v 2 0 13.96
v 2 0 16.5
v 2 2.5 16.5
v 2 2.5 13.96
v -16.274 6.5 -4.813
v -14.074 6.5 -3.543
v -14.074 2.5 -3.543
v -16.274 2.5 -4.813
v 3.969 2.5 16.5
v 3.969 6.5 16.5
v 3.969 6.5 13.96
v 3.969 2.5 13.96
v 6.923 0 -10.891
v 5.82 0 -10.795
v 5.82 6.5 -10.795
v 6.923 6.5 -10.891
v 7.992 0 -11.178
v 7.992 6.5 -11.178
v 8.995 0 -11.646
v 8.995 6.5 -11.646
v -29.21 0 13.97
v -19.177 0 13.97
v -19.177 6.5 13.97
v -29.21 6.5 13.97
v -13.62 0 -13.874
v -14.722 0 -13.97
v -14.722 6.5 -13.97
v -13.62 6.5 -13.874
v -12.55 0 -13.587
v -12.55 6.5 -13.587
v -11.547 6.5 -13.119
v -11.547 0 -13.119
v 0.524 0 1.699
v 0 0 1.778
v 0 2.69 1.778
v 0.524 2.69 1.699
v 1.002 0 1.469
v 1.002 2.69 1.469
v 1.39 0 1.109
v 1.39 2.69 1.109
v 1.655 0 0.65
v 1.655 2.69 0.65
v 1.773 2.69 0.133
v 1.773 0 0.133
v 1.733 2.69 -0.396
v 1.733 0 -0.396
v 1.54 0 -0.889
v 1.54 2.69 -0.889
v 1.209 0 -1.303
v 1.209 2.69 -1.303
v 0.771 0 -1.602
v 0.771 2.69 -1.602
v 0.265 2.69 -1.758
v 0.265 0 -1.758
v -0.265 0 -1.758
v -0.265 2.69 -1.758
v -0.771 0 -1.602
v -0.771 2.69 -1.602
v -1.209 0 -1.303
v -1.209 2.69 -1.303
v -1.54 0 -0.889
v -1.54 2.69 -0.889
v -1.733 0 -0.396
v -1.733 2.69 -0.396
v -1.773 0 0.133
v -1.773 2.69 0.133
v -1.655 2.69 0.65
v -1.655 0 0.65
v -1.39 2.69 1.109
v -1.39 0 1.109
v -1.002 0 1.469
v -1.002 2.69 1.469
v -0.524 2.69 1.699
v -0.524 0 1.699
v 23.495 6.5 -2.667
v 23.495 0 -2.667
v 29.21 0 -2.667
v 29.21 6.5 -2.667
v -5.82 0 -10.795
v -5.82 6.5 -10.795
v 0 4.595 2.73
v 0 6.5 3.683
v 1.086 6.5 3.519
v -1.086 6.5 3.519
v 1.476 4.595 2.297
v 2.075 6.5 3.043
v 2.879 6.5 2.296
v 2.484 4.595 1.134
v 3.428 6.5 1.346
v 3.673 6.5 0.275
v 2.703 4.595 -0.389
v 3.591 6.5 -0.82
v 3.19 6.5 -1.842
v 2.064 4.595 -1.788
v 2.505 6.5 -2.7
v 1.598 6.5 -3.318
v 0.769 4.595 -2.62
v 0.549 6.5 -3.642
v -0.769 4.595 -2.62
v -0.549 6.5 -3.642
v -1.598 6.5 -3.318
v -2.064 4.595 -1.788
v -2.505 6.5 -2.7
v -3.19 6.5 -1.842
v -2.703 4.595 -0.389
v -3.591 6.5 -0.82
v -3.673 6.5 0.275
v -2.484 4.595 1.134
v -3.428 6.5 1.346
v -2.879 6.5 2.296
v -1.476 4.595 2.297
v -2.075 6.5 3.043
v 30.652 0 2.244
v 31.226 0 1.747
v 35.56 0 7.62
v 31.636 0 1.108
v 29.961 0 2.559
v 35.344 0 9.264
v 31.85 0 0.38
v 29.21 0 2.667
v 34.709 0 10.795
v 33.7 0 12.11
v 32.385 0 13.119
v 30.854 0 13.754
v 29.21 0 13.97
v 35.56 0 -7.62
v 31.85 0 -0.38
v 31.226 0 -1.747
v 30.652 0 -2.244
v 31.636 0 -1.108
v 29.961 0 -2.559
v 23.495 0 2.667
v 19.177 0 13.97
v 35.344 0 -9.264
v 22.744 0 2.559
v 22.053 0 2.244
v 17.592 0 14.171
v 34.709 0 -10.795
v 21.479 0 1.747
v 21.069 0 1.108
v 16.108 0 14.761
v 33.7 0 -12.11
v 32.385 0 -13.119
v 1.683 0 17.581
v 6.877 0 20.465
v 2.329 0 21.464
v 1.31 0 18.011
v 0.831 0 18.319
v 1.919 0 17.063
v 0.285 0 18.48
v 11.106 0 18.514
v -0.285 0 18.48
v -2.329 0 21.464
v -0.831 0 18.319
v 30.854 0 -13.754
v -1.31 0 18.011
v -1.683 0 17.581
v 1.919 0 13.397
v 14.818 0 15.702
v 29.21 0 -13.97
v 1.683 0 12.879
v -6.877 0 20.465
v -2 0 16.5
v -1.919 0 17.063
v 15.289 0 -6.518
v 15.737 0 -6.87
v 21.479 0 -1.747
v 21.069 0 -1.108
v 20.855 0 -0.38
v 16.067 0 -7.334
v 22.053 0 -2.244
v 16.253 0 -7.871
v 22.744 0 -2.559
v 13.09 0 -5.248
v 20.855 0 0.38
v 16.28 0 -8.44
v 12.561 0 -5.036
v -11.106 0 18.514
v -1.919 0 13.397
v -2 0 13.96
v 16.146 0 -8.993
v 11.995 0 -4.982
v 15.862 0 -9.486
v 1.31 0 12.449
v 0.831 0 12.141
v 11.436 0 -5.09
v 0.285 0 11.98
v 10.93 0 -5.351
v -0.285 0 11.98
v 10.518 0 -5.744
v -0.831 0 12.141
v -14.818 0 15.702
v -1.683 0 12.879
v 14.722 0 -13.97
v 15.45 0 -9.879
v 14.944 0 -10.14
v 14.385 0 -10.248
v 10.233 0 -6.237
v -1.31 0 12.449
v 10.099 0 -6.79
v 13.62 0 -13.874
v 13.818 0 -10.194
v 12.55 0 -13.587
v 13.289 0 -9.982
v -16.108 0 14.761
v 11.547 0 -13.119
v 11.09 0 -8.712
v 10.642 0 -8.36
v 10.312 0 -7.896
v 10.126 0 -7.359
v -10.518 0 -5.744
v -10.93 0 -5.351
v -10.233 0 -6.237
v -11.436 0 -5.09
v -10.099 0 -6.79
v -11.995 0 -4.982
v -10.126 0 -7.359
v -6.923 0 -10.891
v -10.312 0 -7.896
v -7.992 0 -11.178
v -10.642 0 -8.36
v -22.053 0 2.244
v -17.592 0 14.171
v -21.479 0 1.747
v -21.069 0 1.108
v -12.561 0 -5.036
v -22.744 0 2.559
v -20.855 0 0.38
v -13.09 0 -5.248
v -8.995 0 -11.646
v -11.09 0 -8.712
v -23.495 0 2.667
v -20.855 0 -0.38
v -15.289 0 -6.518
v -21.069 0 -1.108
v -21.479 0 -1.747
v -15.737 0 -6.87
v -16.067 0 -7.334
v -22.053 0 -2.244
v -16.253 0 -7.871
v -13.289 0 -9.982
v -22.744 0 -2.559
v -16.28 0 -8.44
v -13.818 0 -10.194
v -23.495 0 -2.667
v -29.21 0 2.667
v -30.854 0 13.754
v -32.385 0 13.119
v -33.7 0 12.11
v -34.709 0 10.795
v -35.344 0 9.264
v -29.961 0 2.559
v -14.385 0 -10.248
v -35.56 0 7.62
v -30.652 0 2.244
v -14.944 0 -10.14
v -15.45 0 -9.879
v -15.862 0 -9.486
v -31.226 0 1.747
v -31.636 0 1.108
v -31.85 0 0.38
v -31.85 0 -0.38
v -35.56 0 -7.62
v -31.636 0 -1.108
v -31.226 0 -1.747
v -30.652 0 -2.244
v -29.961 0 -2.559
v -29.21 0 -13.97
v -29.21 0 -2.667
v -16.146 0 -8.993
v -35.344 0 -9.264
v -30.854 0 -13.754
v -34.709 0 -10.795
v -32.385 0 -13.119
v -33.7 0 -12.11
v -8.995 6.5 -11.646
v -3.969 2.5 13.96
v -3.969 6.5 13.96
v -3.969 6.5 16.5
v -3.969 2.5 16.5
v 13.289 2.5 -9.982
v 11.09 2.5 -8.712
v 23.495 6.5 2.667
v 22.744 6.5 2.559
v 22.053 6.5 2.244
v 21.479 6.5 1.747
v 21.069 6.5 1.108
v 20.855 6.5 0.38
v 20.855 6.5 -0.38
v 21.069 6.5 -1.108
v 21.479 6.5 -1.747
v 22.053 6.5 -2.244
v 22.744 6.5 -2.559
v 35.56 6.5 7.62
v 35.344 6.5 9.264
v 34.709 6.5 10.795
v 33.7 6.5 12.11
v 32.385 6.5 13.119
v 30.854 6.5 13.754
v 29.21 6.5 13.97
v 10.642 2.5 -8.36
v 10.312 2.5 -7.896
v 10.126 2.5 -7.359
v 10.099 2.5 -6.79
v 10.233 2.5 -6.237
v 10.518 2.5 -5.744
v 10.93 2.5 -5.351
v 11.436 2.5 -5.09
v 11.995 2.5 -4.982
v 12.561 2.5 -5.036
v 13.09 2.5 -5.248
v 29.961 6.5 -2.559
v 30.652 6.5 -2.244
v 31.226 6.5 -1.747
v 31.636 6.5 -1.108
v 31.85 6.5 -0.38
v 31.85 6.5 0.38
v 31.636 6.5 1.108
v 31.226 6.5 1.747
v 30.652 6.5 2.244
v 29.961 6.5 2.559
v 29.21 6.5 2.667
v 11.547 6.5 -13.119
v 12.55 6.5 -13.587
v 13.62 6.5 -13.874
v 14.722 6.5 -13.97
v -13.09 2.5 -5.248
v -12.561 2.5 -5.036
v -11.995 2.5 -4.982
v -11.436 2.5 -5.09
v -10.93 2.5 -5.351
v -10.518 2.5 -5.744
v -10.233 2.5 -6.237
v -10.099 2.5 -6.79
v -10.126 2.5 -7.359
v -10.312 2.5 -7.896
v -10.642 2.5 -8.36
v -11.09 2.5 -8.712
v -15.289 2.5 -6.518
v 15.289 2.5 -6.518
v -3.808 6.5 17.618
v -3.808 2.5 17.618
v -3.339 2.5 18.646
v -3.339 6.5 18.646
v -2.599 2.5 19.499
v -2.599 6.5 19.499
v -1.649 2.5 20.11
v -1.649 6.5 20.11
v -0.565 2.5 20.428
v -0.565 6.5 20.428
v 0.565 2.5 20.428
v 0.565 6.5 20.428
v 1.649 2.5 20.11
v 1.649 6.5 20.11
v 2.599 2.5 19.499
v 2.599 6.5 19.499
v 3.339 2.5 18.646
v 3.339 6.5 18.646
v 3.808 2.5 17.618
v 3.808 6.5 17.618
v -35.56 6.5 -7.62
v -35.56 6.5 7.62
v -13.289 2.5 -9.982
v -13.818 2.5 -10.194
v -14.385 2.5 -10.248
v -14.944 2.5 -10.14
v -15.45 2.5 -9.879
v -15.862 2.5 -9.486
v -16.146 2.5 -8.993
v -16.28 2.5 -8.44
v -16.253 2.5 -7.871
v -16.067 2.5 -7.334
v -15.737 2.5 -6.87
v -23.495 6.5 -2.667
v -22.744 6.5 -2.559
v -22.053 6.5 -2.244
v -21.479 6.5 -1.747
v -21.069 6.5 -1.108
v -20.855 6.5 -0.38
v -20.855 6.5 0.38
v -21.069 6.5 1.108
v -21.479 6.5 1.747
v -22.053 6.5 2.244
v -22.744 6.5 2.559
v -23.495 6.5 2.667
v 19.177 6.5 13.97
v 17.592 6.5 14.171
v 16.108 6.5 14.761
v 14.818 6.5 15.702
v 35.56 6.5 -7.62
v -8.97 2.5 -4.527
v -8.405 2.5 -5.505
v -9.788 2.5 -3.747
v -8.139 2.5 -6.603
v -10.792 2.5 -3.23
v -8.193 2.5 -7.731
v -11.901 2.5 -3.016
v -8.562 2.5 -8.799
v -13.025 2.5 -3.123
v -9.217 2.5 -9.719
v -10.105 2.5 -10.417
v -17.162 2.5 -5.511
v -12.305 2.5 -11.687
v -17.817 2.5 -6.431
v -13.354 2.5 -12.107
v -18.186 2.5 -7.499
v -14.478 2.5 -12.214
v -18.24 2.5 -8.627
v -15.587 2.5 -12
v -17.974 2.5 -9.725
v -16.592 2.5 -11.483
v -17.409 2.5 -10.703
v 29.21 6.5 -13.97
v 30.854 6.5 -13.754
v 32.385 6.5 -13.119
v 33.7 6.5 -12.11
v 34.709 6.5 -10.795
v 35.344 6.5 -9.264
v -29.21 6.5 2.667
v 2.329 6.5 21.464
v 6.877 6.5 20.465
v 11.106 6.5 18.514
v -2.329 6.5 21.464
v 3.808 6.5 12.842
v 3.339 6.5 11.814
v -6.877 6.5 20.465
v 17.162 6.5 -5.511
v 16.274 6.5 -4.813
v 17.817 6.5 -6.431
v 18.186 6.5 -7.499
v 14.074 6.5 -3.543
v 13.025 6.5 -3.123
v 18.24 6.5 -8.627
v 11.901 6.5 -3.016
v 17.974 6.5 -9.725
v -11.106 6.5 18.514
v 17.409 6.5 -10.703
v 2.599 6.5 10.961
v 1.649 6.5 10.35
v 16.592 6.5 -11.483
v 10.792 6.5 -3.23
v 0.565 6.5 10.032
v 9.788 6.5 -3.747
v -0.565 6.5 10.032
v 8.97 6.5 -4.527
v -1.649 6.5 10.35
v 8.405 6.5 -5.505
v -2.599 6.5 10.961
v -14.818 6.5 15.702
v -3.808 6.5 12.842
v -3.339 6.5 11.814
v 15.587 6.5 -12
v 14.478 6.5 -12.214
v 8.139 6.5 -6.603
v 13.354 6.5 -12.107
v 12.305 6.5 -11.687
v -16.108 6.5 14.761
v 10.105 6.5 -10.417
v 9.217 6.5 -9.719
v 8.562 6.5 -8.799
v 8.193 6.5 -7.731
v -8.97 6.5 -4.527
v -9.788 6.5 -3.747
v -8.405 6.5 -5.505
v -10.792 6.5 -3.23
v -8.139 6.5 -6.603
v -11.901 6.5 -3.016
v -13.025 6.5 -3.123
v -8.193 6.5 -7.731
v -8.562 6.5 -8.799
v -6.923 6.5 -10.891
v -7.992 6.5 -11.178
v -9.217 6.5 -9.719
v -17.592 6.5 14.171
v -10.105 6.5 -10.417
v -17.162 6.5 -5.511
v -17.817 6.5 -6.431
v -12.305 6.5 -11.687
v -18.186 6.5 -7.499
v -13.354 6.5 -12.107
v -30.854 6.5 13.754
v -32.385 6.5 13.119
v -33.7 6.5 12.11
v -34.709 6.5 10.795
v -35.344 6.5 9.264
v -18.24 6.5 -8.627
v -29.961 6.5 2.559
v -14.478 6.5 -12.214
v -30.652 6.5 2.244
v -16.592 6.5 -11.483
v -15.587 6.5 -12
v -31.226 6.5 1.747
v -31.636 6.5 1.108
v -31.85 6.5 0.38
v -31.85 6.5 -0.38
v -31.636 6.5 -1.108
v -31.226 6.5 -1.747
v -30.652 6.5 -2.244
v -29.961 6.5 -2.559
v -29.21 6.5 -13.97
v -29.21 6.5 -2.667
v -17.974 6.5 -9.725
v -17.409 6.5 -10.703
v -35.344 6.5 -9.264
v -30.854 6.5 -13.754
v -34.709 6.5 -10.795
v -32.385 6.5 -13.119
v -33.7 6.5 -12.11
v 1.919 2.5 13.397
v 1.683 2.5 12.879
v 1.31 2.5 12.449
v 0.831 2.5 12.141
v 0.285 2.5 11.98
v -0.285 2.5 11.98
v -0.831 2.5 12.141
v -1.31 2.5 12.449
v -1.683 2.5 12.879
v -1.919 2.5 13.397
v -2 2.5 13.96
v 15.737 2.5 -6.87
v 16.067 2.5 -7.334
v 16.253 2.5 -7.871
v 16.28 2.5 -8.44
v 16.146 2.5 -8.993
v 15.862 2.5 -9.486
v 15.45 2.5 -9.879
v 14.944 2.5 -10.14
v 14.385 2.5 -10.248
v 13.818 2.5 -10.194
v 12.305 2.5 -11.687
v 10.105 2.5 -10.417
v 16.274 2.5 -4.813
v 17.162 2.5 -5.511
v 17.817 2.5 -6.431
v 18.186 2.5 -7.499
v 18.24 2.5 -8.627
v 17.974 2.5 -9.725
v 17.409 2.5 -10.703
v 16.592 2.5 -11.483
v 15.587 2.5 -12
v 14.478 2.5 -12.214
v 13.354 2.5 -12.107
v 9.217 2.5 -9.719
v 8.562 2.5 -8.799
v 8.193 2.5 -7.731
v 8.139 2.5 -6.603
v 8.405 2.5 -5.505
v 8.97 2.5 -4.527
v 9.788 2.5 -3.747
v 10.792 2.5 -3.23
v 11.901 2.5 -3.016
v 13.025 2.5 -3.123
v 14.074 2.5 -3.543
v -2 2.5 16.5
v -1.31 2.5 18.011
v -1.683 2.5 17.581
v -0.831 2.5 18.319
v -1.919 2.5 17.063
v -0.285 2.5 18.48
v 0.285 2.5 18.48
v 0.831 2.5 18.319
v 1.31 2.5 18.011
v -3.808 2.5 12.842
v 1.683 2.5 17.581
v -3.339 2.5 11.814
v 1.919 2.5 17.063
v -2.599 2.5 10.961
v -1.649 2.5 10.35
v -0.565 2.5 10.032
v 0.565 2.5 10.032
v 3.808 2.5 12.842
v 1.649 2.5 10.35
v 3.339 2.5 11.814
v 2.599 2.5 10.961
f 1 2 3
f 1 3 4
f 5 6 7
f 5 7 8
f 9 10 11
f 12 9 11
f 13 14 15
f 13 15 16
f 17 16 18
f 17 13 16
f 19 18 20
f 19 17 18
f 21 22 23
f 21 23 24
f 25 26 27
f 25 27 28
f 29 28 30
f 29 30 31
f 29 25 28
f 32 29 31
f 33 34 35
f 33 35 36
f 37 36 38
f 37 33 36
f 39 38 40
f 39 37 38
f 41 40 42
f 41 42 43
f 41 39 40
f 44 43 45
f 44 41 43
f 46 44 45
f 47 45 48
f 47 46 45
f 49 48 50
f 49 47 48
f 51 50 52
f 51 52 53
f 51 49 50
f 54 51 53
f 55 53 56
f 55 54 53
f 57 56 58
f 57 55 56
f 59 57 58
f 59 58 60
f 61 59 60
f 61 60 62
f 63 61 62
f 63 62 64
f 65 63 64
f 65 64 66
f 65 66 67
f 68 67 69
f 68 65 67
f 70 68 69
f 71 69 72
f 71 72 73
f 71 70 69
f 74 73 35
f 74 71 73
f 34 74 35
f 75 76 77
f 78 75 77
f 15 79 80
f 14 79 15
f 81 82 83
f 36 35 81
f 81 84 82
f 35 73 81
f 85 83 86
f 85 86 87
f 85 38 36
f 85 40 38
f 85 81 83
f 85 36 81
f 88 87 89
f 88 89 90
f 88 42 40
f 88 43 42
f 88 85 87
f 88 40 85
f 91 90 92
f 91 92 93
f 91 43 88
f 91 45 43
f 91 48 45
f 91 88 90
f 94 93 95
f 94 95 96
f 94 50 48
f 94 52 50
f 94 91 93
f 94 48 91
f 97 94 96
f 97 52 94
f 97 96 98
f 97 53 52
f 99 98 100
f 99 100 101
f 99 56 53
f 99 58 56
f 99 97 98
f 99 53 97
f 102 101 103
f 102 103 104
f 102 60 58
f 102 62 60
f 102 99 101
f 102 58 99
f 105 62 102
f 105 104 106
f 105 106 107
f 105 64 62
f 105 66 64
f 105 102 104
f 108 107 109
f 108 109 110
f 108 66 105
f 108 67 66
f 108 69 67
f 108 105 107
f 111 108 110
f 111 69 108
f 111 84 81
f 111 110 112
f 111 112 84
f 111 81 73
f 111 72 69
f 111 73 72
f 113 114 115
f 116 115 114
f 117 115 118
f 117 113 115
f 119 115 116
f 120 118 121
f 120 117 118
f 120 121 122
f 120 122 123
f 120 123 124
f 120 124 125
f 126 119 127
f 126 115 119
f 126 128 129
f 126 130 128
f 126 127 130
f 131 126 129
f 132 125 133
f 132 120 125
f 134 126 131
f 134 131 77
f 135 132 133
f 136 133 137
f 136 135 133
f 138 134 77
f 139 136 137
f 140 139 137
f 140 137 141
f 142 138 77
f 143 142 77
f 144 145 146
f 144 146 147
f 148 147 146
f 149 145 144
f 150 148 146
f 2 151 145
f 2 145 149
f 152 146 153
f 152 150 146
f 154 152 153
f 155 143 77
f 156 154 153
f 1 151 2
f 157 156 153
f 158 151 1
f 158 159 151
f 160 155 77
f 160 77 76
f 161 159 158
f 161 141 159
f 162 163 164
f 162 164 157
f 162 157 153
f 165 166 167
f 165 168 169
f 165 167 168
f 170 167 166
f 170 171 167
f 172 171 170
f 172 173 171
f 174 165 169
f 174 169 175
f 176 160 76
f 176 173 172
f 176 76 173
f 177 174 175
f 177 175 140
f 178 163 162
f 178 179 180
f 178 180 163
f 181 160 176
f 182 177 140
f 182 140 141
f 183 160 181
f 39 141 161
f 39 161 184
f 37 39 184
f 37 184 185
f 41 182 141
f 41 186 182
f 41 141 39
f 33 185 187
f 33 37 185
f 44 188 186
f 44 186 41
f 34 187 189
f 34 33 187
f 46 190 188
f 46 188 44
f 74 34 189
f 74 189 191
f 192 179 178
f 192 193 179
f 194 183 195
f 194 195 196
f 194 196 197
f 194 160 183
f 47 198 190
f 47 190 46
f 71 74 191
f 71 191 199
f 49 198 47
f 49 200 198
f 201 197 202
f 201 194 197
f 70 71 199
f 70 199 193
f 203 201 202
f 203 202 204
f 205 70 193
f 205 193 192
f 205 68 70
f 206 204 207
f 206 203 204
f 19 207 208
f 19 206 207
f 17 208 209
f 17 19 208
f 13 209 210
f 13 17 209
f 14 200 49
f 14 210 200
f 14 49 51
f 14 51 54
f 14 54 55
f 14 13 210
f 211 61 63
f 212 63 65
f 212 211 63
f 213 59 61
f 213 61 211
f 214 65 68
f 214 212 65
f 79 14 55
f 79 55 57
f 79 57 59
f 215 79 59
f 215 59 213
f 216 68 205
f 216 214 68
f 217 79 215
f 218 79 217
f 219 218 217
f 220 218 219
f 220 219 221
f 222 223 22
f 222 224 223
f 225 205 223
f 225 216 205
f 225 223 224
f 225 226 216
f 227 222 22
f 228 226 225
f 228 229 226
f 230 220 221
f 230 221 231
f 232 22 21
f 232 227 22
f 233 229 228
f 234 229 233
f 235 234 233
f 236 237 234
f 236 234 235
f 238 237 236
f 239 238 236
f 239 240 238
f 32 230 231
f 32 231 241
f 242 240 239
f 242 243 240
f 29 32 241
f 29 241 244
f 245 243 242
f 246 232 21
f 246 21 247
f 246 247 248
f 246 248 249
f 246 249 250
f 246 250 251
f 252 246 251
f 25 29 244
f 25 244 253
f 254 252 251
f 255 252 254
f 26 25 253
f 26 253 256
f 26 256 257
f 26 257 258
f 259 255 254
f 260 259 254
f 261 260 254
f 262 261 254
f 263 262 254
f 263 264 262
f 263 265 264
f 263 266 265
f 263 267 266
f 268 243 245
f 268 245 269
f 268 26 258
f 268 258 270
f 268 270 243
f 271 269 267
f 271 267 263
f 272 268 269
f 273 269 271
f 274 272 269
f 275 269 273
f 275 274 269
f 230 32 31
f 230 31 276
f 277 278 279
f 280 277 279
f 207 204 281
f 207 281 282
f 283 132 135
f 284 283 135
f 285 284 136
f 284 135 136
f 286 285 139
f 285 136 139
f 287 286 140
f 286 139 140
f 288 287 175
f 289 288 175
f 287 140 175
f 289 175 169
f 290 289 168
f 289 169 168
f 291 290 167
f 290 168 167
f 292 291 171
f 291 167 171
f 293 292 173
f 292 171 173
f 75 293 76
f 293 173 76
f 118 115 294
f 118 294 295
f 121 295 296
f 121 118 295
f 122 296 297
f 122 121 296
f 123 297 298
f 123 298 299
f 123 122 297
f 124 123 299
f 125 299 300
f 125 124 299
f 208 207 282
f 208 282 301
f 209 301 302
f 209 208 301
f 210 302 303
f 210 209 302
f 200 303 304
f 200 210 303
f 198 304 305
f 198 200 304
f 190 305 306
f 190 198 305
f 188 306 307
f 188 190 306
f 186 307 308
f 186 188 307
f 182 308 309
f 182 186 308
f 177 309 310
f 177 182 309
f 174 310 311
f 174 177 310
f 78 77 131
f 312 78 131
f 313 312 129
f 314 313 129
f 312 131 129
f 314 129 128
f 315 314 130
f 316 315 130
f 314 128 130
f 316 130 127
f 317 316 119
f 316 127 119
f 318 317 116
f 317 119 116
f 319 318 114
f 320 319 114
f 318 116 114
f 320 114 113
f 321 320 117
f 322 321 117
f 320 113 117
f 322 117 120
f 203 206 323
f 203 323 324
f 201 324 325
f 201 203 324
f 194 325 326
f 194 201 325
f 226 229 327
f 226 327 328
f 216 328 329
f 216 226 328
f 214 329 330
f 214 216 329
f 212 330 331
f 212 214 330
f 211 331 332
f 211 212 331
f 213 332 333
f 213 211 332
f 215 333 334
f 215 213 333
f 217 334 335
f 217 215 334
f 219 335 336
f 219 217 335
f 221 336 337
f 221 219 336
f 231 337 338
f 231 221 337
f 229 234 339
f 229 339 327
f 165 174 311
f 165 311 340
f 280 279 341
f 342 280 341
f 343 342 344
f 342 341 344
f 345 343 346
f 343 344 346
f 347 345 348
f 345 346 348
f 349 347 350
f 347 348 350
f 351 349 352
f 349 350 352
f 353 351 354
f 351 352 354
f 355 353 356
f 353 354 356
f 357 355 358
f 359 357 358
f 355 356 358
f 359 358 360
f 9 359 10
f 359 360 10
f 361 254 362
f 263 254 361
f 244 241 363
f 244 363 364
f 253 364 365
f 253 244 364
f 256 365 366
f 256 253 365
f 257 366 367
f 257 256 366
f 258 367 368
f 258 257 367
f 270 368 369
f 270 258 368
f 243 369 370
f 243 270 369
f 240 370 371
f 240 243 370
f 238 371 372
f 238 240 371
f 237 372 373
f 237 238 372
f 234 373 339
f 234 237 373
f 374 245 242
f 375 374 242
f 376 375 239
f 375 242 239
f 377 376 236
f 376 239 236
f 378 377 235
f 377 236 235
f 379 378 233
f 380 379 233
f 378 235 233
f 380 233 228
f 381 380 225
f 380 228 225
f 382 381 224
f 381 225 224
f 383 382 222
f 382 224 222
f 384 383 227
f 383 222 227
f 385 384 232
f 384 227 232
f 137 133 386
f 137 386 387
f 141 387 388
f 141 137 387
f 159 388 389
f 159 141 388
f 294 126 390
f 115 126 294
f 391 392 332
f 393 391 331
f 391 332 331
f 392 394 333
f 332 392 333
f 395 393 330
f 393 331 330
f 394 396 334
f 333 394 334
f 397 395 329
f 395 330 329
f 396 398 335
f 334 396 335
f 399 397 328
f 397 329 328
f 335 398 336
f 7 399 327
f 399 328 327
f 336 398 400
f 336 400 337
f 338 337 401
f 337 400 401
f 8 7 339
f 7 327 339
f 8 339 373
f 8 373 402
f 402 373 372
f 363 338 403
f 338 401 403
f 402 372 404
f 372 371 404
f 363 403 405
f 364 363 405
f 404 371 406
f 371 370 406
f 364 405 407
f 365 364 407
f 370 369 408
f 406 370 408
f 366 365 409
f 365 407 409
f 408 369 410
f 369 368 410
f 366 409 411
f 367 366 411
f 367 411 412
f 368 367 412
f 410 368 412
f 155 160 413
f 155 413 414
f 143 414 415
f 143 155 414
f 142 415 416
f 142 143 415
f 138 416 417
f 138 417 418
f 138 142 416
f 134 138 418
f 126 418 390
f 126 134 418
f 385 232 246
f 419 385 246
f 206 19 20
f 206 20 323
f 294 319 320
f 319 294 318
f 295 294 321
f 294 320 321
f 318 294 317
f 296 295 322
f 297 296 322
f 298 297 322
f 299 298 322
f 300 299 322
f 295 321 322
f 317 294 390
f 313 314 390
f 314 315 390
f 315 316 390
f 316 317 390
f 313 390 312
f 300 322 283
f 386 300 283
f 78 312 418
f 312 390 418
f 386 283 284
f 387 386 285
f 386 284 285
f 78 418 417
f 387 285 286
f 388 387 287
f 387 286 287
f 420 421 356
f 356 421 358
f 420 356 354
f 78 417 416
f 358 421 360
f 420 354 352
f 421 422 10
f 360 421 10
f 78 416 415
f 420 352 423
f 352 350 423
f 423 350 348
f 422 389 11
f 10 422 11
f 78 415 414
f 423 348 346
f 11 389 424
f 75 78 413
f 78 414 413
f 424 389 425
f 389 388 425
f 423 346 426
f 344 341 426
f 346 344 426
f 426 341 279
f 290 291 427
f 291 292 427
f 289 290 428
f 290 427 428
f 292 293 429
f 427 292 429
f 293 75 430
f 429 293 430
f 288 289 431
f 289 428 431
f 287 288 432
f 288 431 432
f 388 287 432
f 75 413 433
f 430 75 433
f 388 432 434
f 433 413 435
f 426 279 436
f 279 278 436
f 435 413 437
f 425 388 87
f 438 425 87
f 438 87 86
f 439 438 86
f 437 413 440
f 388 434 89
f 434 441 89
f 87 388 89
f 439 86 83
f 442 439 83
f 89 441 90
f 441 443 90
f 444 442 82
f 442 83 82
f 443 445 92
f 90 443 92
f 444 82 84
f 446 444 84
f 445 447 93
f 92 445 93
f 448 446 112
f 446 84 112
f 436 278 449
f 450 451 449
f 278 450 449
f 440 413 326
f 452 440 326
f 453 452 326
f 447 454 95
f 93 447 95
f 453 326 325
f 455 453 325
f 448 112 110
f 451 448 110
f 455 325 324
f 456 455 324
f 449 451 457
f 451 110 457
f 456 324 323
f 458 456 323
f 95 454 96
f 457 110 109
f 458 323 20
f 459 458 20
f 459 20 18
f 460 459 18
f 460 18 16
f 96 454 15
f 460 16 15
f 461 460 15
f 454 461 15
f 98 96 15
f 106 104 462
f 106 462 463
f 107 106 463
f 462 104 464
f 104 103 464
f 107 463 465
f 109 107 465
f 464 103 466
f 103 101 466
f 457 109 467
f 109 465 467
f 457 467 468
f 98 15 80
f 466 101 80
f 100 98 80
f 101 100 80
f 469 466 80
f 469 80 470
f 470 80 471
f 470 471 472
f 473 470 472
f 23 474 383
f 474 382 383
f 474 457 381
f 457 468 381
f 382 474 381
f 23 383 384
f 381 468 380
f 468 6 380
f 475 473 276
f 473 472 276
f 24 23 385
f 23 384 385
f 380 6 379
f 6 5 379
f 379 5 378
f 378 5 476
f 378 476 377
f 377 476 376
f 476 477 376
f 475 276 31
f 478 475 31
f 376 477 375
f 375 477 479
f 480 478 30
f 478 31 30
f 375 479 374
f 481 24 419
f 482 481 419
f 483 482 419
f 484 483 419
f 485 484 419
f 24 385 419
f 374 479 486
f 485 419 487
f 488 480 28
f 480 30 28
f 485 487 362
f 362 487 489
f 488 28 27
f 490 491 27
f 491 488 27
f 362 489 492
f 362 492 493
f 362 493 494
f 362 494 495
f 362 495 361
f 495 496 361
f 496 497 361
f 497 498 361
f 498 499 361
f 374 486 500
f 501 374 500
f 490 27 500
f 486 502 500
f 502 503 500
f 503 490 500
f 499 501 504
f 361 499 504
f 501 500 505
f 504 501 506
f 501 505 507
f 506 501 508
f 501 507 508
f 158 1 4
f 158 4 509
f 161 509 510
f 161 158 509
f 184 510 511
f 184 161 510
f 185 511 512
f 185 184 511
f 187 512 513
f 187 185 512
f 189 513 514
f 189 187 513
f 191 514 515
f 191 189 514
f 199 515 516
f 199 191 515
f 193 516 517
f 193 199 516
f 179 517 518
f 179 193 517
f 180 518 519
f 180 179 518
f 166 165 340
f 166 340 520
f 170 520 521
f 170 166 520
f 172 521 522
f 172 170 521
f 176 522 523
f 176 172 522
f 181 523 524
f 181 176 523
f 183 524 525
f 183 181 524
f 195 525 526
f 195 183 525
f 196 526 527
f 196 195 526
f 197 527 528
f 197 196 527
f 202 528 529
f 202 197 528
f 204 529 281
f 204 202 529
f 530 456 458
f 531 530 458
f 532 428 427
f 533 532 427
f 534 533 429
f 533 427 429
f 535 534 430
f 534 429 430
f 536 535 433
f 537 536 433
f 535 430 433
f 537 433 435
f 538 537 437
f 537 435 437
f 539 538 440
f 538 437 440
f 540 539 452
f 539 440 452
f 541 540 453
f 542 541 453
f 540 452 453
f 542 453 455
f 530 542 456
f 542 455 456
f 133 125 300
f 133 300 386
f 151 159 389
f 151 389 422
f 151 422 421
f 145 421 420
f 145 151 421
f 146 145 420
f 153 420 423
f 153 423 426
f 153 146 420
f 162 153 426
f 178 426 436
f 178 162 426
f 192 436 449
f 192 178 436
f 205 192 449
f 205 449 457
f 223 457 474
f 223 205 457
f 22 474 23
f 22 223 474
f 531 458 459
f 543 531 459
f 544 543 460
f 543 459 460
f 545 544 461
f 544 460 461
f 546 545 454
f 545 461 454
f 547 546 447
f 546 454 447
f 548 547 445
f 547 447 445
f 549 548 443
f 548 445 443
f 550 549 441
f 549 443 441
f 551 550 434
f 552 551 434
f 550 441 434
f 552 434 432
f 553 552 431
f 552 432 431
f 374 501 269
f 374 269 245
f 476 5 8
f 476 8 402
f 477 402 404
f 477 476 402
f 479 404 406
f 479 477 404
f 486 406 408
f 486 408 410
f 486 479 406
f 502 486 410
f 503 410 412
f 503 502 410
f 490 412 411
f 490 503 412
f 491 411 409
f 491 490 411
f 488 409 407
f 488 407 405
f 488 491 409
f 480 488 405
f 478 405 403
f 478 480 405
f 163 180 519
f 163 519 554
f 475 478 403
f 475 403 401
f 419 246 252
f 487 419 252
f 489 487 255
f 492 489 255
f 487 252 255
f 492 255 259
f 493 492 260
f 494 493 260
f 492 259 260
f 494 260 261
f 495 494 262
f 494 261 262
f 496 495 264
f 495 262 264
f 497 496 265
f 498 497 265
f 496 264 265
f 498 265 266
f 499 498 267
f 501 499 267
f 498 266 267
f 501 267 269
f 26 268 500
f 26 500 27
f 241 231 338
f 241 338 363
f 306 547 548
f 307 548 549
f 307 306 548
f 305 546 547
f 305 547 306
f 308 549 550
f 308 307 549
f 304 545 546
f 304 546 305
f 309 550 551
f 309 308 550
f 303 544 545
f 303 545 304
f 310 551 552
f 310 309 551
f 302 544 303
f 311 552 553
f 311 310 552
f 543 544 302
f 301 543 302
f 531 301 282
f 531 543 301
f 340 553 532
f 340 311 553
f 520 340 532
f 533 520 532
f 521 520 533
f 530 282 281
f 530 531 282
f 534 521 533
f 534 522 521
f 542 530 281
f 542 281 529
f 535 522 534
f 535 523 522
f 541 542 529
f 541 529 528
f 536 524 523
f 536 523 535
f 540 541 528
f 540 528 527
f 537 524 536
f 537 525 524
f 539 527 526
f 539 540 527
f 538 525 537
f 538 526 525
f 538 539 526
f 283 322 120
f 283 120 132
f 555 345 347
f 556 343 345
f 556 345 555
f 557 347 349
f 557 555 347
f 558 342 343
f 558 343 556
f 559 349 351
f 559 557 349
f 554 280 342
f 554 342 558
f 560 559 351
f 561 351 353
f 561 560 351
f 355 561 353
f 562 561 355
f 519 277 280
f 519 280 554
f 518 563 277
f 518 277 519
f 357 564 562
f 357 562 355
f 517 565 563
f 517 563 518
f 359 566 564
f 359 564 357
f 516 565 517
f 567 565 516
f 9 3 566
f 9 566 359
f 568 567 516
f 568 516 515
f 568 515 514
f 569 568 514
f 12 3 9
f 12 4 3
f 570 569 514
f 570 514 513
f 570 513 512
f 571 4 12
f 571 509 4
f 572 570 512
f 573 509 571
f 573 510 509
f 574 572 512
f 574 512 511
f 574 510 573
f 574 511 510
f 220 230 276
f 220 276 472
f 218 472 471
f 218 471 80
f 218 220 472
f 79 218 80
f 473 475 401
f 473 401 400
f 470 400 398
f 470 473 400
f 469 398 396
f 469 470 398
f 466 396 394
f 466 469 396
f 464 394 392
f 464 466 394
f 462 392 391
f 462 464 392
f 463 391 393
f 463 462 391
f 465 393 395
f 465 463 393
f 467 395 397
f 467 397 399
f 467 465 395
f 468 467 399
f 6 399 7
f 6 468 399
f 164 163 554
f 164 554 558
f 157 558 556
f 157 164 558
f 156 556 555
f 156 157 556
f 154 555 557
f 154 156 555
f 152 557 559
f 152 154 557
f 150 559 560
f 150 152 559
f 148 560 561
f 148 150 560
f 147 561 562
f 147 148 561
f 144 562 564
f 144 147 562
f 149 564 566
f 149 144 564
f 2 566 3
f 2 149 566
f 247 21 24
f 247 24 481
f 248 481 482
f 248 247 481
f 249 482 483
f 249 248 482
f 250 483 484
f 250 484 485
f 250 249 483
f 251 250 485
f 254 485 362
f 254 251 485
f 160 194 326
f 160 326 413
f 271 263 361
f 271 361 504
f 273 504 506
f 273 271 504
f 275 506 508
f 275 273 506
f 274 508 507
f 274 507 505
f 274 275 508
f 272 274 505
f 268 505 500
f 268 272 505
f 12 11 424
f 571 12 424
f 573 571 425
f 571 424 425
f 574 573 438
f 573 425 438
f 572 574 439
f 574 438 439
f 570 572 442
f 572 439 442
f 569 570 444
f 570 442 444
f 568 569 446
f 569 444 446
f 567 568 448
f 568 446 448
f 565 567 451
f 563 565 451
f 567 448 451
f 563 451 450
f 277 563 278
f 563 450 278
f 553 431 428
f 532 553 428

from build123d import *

# Parameters (mm, degrees)
SKETCH1_R           = 1.778
BOSS_EXTRUDE1_DEPTH = 6.5
CUT_EXTRUDE1_DEPTH  = 4
CHAMFER1_SIZE       = 1.905
CHAMFER1_SIZE2      = 3.81


with BuildPart() as part:
    # Sketch1 → Boss-Extrude1 (new body)
    with BuildSketch(Plane(origin=(0, 0, 0), x_dir=(1, 0, 0), z_dir=(0, 1, 0))):
        with BuildLine():
            Line((14.722227154, 13.97), (29.21, 13.97))
            ThreePointArc((29.21, 13.97), (33.700128061, 12.110128061), (35.56, 7.62))
            Line((35.56, 7.62), (35.56, -7.62))
            ThreePointArc((35.56, -7.62), (33.700128061, -12.110128061), (29.21, -13.97))
            Line((29.21, -13.97), (19.176579466, -13.97))
            ThreePointArc((19.176579466, -13.97), (16.831686562, -14.418815604), (14.818265951, -15.701818182))
            ThreePointArc((14.818265951, -15.701818182), (0, -21.59), (-14.818265951, -15.701818182))
            ThreePointArc((-14.818265951, -15.701818182), (-16.831686562, -14.418815604), (-19.176579466, -13.97))
            Line((-19.176579466, -13.97), (-29.21, -13.97))
            ThreePointArc((-29.21, -13.97), (-33.700128061, -12.110128061), (-35.56, -7.62))
            Line((-35.56, -7.62), (-35.56, 7.62))
            ThreePointArc((-35.56, 7.62), (-33.700128061, 12.110128061), (-29.21, 13.97))
            Line((-29.21, 13.97), (-14.722227154, 13.97))
            ThreePointArc((-14.722227154, 13.97), (-13.078726217, 13.753628997), (-11.547227154, 13.119261314))
            Line((-11.547227154, 13.119261314), (-8.995011096, 11.645738686))
            ThreePointArc((-8.995011096, 11.645738686), (-7.463512032, 11.011371003), (-5.820011096, 10.795))
            Line((-5.820011096, 10.795), (5.820011096, 10.795))
            ThreePointArc((5.820011096, 10.795), (7.463512032, 11.011371003), (8.995011096, 11.645738686))
            Line((8.995011096, 11.645738686), (11.547227154, 13.119261314))
            ThreePointArc((11.547227154, 13.119261314), (13.078726217, 13.753628997), (14.722227154, 13.97))
        make_face()
        with Locations(Location((0, 0, 0), (0, 0, 270))):  # turned: the seam where the file's is
            Circle(SKETCH1_R, mode=Mode.SUBTRACT)
        with BuildLine():
            Line((-23.495, -2.667), (-29.21, -2.667))
            ThreePointArc((-29.21, -2.667), (-31.877, 0), (-29.21, 2.667))
            Line((-29.21, 2.667), (-23.495, 2.667))
            ThreePointArc((-23.495, 2.667), (-20.828, 0), (-23.495, -2.667))
        make_face(mode=Mode.SUBTRACT)
        with BuildLine():
            Line((23.495, 2.667), (29.21, 2.667))
            ThreePointArc((29.21, 2.667), (31.877, 0), (29.21, -2.667))
            Line((29.21, -2.667), (23.495, -2.667))
            ThreePointArc((23.495, -2.667), (20.828, 0), (23.495, 2.667))
        make_face(mode=Mode.SUBTRACT)
        with BuildLine():
            Line((-15.289419162, 6.517949192), (-13.089714637, 5.247949192))
            ThreePointArc((-13.089714637, 5.247949192), (-10.357663829, 5.98), (-11.089714637, 8.712050808))
            Line((-11.089714637, 8.712050808), (-13.289419162, 9.982050808))
            ThreePointArc((-13.289419162, 9.982050808), (-16.02146997, 9.25), (-15.289419162, 6.517949192))
        make_face(mode=Mode.SUBTRACT)
        with BuildLine():
            Line((13.289419162, 9.982050808), (11.089714637, 8.712050808))
            ThreePointArc((11.089714637, 8.712050808), (10.357663829, 5.98), (13.089714637, 5.247949192))
            Line((13.089714637, 5.247949192), (15.289419162, 6.517949192))
            ThreePointArc((15.289419162, 6.517949192), (16.02146997, 9.25), (13.289419162, 9.982050808))
        make_face(mode=Mode.SUBTRACT)
        with BuildLine():
            Line((2, -16.5), (2, -13.96))
            ThreePointArc((2, -13.96), (0, -11.96), (-2, -13.96))
            Line((-2, -13.96), (-2, -16.5))
            ThreePointArc((-2, -16.5), (0, -18.5), (2, -16.5))
        make_face(mode=Mode.SUBTRACT)
    extrude(amount=BOSS_EXTRUDE1_DEPTH)

    # Sketch5 → Cut-Extrude1 (cut)
    with BuildSketch(Plane(origin=(0, 6.5, 0), x_dir=(1, 0, 0), z_dir=(0, 1, 0))):
        with BuildLine():
            Line((-3.96875, -13.96), (-3.96875, -16.5))
            ThreePointArc((-3.96875, -16.5), (0, -20.46875), (3.96875, -16.5))
            Line((3.96875, -16.5), (3.96875, -13.96))
            ThreePointArc((3.96875, -13.96), (0, -9.99125), (-3.96875, -13.96))
        make_face()
        with BuildLine():
            Line((12.305044162, 11.687038321), (10.105339637, 10.417038321))
            ThreePointArc((10.105339637, 10.417038321), (8.652676316, 4.995625), (14.074089637, 3.542961679))
            Line((14.074089637, 3.542961679), (16.273794162, 4.812961679))
            ThreePointArc((16.273794162, 4.812961679), (17.726457484, 10.234375), (12.305044162, 11.687038321))
        make_face()
        with BuildLine():
            Line((-12.305044162, 11.687038321), (-10.105339637, 10.417038321))
            ThreePointArc((-10.105339637, 10.417038321), (-8.652676316, 4.995625), (-14.074089637, 3.542961679))
            Line((-14.074089637, 3.542961679), (-16.273794162, 4.812961679))
            ThreePointArc((-16.273794162, 4.812961679), (-17.726457484, 10.234375), (-12.305044162, 11.687038321))
        make_face()
    extrude(amount=-CUT_EXTRUDE1_DEPTH, mode=Mode.SUBTRACT)

    # Chamfer1
    chamfer1_edges = [part.edges().sort_by_distance(p)[0] for p in [
        (0, 6.5, -1.778),
    ]]
    chamfer1_side = [part.faces().sort_by_distance(p)[0] for p in [
        (0, 6.5, 2.195443335),
    ]]
    chamfer(chamfer1_edges, length=CHAMFER1_SIZE, length2=CHAMFER1_SIZE2, reference=chamfer1_side[0])


solid = part.part
